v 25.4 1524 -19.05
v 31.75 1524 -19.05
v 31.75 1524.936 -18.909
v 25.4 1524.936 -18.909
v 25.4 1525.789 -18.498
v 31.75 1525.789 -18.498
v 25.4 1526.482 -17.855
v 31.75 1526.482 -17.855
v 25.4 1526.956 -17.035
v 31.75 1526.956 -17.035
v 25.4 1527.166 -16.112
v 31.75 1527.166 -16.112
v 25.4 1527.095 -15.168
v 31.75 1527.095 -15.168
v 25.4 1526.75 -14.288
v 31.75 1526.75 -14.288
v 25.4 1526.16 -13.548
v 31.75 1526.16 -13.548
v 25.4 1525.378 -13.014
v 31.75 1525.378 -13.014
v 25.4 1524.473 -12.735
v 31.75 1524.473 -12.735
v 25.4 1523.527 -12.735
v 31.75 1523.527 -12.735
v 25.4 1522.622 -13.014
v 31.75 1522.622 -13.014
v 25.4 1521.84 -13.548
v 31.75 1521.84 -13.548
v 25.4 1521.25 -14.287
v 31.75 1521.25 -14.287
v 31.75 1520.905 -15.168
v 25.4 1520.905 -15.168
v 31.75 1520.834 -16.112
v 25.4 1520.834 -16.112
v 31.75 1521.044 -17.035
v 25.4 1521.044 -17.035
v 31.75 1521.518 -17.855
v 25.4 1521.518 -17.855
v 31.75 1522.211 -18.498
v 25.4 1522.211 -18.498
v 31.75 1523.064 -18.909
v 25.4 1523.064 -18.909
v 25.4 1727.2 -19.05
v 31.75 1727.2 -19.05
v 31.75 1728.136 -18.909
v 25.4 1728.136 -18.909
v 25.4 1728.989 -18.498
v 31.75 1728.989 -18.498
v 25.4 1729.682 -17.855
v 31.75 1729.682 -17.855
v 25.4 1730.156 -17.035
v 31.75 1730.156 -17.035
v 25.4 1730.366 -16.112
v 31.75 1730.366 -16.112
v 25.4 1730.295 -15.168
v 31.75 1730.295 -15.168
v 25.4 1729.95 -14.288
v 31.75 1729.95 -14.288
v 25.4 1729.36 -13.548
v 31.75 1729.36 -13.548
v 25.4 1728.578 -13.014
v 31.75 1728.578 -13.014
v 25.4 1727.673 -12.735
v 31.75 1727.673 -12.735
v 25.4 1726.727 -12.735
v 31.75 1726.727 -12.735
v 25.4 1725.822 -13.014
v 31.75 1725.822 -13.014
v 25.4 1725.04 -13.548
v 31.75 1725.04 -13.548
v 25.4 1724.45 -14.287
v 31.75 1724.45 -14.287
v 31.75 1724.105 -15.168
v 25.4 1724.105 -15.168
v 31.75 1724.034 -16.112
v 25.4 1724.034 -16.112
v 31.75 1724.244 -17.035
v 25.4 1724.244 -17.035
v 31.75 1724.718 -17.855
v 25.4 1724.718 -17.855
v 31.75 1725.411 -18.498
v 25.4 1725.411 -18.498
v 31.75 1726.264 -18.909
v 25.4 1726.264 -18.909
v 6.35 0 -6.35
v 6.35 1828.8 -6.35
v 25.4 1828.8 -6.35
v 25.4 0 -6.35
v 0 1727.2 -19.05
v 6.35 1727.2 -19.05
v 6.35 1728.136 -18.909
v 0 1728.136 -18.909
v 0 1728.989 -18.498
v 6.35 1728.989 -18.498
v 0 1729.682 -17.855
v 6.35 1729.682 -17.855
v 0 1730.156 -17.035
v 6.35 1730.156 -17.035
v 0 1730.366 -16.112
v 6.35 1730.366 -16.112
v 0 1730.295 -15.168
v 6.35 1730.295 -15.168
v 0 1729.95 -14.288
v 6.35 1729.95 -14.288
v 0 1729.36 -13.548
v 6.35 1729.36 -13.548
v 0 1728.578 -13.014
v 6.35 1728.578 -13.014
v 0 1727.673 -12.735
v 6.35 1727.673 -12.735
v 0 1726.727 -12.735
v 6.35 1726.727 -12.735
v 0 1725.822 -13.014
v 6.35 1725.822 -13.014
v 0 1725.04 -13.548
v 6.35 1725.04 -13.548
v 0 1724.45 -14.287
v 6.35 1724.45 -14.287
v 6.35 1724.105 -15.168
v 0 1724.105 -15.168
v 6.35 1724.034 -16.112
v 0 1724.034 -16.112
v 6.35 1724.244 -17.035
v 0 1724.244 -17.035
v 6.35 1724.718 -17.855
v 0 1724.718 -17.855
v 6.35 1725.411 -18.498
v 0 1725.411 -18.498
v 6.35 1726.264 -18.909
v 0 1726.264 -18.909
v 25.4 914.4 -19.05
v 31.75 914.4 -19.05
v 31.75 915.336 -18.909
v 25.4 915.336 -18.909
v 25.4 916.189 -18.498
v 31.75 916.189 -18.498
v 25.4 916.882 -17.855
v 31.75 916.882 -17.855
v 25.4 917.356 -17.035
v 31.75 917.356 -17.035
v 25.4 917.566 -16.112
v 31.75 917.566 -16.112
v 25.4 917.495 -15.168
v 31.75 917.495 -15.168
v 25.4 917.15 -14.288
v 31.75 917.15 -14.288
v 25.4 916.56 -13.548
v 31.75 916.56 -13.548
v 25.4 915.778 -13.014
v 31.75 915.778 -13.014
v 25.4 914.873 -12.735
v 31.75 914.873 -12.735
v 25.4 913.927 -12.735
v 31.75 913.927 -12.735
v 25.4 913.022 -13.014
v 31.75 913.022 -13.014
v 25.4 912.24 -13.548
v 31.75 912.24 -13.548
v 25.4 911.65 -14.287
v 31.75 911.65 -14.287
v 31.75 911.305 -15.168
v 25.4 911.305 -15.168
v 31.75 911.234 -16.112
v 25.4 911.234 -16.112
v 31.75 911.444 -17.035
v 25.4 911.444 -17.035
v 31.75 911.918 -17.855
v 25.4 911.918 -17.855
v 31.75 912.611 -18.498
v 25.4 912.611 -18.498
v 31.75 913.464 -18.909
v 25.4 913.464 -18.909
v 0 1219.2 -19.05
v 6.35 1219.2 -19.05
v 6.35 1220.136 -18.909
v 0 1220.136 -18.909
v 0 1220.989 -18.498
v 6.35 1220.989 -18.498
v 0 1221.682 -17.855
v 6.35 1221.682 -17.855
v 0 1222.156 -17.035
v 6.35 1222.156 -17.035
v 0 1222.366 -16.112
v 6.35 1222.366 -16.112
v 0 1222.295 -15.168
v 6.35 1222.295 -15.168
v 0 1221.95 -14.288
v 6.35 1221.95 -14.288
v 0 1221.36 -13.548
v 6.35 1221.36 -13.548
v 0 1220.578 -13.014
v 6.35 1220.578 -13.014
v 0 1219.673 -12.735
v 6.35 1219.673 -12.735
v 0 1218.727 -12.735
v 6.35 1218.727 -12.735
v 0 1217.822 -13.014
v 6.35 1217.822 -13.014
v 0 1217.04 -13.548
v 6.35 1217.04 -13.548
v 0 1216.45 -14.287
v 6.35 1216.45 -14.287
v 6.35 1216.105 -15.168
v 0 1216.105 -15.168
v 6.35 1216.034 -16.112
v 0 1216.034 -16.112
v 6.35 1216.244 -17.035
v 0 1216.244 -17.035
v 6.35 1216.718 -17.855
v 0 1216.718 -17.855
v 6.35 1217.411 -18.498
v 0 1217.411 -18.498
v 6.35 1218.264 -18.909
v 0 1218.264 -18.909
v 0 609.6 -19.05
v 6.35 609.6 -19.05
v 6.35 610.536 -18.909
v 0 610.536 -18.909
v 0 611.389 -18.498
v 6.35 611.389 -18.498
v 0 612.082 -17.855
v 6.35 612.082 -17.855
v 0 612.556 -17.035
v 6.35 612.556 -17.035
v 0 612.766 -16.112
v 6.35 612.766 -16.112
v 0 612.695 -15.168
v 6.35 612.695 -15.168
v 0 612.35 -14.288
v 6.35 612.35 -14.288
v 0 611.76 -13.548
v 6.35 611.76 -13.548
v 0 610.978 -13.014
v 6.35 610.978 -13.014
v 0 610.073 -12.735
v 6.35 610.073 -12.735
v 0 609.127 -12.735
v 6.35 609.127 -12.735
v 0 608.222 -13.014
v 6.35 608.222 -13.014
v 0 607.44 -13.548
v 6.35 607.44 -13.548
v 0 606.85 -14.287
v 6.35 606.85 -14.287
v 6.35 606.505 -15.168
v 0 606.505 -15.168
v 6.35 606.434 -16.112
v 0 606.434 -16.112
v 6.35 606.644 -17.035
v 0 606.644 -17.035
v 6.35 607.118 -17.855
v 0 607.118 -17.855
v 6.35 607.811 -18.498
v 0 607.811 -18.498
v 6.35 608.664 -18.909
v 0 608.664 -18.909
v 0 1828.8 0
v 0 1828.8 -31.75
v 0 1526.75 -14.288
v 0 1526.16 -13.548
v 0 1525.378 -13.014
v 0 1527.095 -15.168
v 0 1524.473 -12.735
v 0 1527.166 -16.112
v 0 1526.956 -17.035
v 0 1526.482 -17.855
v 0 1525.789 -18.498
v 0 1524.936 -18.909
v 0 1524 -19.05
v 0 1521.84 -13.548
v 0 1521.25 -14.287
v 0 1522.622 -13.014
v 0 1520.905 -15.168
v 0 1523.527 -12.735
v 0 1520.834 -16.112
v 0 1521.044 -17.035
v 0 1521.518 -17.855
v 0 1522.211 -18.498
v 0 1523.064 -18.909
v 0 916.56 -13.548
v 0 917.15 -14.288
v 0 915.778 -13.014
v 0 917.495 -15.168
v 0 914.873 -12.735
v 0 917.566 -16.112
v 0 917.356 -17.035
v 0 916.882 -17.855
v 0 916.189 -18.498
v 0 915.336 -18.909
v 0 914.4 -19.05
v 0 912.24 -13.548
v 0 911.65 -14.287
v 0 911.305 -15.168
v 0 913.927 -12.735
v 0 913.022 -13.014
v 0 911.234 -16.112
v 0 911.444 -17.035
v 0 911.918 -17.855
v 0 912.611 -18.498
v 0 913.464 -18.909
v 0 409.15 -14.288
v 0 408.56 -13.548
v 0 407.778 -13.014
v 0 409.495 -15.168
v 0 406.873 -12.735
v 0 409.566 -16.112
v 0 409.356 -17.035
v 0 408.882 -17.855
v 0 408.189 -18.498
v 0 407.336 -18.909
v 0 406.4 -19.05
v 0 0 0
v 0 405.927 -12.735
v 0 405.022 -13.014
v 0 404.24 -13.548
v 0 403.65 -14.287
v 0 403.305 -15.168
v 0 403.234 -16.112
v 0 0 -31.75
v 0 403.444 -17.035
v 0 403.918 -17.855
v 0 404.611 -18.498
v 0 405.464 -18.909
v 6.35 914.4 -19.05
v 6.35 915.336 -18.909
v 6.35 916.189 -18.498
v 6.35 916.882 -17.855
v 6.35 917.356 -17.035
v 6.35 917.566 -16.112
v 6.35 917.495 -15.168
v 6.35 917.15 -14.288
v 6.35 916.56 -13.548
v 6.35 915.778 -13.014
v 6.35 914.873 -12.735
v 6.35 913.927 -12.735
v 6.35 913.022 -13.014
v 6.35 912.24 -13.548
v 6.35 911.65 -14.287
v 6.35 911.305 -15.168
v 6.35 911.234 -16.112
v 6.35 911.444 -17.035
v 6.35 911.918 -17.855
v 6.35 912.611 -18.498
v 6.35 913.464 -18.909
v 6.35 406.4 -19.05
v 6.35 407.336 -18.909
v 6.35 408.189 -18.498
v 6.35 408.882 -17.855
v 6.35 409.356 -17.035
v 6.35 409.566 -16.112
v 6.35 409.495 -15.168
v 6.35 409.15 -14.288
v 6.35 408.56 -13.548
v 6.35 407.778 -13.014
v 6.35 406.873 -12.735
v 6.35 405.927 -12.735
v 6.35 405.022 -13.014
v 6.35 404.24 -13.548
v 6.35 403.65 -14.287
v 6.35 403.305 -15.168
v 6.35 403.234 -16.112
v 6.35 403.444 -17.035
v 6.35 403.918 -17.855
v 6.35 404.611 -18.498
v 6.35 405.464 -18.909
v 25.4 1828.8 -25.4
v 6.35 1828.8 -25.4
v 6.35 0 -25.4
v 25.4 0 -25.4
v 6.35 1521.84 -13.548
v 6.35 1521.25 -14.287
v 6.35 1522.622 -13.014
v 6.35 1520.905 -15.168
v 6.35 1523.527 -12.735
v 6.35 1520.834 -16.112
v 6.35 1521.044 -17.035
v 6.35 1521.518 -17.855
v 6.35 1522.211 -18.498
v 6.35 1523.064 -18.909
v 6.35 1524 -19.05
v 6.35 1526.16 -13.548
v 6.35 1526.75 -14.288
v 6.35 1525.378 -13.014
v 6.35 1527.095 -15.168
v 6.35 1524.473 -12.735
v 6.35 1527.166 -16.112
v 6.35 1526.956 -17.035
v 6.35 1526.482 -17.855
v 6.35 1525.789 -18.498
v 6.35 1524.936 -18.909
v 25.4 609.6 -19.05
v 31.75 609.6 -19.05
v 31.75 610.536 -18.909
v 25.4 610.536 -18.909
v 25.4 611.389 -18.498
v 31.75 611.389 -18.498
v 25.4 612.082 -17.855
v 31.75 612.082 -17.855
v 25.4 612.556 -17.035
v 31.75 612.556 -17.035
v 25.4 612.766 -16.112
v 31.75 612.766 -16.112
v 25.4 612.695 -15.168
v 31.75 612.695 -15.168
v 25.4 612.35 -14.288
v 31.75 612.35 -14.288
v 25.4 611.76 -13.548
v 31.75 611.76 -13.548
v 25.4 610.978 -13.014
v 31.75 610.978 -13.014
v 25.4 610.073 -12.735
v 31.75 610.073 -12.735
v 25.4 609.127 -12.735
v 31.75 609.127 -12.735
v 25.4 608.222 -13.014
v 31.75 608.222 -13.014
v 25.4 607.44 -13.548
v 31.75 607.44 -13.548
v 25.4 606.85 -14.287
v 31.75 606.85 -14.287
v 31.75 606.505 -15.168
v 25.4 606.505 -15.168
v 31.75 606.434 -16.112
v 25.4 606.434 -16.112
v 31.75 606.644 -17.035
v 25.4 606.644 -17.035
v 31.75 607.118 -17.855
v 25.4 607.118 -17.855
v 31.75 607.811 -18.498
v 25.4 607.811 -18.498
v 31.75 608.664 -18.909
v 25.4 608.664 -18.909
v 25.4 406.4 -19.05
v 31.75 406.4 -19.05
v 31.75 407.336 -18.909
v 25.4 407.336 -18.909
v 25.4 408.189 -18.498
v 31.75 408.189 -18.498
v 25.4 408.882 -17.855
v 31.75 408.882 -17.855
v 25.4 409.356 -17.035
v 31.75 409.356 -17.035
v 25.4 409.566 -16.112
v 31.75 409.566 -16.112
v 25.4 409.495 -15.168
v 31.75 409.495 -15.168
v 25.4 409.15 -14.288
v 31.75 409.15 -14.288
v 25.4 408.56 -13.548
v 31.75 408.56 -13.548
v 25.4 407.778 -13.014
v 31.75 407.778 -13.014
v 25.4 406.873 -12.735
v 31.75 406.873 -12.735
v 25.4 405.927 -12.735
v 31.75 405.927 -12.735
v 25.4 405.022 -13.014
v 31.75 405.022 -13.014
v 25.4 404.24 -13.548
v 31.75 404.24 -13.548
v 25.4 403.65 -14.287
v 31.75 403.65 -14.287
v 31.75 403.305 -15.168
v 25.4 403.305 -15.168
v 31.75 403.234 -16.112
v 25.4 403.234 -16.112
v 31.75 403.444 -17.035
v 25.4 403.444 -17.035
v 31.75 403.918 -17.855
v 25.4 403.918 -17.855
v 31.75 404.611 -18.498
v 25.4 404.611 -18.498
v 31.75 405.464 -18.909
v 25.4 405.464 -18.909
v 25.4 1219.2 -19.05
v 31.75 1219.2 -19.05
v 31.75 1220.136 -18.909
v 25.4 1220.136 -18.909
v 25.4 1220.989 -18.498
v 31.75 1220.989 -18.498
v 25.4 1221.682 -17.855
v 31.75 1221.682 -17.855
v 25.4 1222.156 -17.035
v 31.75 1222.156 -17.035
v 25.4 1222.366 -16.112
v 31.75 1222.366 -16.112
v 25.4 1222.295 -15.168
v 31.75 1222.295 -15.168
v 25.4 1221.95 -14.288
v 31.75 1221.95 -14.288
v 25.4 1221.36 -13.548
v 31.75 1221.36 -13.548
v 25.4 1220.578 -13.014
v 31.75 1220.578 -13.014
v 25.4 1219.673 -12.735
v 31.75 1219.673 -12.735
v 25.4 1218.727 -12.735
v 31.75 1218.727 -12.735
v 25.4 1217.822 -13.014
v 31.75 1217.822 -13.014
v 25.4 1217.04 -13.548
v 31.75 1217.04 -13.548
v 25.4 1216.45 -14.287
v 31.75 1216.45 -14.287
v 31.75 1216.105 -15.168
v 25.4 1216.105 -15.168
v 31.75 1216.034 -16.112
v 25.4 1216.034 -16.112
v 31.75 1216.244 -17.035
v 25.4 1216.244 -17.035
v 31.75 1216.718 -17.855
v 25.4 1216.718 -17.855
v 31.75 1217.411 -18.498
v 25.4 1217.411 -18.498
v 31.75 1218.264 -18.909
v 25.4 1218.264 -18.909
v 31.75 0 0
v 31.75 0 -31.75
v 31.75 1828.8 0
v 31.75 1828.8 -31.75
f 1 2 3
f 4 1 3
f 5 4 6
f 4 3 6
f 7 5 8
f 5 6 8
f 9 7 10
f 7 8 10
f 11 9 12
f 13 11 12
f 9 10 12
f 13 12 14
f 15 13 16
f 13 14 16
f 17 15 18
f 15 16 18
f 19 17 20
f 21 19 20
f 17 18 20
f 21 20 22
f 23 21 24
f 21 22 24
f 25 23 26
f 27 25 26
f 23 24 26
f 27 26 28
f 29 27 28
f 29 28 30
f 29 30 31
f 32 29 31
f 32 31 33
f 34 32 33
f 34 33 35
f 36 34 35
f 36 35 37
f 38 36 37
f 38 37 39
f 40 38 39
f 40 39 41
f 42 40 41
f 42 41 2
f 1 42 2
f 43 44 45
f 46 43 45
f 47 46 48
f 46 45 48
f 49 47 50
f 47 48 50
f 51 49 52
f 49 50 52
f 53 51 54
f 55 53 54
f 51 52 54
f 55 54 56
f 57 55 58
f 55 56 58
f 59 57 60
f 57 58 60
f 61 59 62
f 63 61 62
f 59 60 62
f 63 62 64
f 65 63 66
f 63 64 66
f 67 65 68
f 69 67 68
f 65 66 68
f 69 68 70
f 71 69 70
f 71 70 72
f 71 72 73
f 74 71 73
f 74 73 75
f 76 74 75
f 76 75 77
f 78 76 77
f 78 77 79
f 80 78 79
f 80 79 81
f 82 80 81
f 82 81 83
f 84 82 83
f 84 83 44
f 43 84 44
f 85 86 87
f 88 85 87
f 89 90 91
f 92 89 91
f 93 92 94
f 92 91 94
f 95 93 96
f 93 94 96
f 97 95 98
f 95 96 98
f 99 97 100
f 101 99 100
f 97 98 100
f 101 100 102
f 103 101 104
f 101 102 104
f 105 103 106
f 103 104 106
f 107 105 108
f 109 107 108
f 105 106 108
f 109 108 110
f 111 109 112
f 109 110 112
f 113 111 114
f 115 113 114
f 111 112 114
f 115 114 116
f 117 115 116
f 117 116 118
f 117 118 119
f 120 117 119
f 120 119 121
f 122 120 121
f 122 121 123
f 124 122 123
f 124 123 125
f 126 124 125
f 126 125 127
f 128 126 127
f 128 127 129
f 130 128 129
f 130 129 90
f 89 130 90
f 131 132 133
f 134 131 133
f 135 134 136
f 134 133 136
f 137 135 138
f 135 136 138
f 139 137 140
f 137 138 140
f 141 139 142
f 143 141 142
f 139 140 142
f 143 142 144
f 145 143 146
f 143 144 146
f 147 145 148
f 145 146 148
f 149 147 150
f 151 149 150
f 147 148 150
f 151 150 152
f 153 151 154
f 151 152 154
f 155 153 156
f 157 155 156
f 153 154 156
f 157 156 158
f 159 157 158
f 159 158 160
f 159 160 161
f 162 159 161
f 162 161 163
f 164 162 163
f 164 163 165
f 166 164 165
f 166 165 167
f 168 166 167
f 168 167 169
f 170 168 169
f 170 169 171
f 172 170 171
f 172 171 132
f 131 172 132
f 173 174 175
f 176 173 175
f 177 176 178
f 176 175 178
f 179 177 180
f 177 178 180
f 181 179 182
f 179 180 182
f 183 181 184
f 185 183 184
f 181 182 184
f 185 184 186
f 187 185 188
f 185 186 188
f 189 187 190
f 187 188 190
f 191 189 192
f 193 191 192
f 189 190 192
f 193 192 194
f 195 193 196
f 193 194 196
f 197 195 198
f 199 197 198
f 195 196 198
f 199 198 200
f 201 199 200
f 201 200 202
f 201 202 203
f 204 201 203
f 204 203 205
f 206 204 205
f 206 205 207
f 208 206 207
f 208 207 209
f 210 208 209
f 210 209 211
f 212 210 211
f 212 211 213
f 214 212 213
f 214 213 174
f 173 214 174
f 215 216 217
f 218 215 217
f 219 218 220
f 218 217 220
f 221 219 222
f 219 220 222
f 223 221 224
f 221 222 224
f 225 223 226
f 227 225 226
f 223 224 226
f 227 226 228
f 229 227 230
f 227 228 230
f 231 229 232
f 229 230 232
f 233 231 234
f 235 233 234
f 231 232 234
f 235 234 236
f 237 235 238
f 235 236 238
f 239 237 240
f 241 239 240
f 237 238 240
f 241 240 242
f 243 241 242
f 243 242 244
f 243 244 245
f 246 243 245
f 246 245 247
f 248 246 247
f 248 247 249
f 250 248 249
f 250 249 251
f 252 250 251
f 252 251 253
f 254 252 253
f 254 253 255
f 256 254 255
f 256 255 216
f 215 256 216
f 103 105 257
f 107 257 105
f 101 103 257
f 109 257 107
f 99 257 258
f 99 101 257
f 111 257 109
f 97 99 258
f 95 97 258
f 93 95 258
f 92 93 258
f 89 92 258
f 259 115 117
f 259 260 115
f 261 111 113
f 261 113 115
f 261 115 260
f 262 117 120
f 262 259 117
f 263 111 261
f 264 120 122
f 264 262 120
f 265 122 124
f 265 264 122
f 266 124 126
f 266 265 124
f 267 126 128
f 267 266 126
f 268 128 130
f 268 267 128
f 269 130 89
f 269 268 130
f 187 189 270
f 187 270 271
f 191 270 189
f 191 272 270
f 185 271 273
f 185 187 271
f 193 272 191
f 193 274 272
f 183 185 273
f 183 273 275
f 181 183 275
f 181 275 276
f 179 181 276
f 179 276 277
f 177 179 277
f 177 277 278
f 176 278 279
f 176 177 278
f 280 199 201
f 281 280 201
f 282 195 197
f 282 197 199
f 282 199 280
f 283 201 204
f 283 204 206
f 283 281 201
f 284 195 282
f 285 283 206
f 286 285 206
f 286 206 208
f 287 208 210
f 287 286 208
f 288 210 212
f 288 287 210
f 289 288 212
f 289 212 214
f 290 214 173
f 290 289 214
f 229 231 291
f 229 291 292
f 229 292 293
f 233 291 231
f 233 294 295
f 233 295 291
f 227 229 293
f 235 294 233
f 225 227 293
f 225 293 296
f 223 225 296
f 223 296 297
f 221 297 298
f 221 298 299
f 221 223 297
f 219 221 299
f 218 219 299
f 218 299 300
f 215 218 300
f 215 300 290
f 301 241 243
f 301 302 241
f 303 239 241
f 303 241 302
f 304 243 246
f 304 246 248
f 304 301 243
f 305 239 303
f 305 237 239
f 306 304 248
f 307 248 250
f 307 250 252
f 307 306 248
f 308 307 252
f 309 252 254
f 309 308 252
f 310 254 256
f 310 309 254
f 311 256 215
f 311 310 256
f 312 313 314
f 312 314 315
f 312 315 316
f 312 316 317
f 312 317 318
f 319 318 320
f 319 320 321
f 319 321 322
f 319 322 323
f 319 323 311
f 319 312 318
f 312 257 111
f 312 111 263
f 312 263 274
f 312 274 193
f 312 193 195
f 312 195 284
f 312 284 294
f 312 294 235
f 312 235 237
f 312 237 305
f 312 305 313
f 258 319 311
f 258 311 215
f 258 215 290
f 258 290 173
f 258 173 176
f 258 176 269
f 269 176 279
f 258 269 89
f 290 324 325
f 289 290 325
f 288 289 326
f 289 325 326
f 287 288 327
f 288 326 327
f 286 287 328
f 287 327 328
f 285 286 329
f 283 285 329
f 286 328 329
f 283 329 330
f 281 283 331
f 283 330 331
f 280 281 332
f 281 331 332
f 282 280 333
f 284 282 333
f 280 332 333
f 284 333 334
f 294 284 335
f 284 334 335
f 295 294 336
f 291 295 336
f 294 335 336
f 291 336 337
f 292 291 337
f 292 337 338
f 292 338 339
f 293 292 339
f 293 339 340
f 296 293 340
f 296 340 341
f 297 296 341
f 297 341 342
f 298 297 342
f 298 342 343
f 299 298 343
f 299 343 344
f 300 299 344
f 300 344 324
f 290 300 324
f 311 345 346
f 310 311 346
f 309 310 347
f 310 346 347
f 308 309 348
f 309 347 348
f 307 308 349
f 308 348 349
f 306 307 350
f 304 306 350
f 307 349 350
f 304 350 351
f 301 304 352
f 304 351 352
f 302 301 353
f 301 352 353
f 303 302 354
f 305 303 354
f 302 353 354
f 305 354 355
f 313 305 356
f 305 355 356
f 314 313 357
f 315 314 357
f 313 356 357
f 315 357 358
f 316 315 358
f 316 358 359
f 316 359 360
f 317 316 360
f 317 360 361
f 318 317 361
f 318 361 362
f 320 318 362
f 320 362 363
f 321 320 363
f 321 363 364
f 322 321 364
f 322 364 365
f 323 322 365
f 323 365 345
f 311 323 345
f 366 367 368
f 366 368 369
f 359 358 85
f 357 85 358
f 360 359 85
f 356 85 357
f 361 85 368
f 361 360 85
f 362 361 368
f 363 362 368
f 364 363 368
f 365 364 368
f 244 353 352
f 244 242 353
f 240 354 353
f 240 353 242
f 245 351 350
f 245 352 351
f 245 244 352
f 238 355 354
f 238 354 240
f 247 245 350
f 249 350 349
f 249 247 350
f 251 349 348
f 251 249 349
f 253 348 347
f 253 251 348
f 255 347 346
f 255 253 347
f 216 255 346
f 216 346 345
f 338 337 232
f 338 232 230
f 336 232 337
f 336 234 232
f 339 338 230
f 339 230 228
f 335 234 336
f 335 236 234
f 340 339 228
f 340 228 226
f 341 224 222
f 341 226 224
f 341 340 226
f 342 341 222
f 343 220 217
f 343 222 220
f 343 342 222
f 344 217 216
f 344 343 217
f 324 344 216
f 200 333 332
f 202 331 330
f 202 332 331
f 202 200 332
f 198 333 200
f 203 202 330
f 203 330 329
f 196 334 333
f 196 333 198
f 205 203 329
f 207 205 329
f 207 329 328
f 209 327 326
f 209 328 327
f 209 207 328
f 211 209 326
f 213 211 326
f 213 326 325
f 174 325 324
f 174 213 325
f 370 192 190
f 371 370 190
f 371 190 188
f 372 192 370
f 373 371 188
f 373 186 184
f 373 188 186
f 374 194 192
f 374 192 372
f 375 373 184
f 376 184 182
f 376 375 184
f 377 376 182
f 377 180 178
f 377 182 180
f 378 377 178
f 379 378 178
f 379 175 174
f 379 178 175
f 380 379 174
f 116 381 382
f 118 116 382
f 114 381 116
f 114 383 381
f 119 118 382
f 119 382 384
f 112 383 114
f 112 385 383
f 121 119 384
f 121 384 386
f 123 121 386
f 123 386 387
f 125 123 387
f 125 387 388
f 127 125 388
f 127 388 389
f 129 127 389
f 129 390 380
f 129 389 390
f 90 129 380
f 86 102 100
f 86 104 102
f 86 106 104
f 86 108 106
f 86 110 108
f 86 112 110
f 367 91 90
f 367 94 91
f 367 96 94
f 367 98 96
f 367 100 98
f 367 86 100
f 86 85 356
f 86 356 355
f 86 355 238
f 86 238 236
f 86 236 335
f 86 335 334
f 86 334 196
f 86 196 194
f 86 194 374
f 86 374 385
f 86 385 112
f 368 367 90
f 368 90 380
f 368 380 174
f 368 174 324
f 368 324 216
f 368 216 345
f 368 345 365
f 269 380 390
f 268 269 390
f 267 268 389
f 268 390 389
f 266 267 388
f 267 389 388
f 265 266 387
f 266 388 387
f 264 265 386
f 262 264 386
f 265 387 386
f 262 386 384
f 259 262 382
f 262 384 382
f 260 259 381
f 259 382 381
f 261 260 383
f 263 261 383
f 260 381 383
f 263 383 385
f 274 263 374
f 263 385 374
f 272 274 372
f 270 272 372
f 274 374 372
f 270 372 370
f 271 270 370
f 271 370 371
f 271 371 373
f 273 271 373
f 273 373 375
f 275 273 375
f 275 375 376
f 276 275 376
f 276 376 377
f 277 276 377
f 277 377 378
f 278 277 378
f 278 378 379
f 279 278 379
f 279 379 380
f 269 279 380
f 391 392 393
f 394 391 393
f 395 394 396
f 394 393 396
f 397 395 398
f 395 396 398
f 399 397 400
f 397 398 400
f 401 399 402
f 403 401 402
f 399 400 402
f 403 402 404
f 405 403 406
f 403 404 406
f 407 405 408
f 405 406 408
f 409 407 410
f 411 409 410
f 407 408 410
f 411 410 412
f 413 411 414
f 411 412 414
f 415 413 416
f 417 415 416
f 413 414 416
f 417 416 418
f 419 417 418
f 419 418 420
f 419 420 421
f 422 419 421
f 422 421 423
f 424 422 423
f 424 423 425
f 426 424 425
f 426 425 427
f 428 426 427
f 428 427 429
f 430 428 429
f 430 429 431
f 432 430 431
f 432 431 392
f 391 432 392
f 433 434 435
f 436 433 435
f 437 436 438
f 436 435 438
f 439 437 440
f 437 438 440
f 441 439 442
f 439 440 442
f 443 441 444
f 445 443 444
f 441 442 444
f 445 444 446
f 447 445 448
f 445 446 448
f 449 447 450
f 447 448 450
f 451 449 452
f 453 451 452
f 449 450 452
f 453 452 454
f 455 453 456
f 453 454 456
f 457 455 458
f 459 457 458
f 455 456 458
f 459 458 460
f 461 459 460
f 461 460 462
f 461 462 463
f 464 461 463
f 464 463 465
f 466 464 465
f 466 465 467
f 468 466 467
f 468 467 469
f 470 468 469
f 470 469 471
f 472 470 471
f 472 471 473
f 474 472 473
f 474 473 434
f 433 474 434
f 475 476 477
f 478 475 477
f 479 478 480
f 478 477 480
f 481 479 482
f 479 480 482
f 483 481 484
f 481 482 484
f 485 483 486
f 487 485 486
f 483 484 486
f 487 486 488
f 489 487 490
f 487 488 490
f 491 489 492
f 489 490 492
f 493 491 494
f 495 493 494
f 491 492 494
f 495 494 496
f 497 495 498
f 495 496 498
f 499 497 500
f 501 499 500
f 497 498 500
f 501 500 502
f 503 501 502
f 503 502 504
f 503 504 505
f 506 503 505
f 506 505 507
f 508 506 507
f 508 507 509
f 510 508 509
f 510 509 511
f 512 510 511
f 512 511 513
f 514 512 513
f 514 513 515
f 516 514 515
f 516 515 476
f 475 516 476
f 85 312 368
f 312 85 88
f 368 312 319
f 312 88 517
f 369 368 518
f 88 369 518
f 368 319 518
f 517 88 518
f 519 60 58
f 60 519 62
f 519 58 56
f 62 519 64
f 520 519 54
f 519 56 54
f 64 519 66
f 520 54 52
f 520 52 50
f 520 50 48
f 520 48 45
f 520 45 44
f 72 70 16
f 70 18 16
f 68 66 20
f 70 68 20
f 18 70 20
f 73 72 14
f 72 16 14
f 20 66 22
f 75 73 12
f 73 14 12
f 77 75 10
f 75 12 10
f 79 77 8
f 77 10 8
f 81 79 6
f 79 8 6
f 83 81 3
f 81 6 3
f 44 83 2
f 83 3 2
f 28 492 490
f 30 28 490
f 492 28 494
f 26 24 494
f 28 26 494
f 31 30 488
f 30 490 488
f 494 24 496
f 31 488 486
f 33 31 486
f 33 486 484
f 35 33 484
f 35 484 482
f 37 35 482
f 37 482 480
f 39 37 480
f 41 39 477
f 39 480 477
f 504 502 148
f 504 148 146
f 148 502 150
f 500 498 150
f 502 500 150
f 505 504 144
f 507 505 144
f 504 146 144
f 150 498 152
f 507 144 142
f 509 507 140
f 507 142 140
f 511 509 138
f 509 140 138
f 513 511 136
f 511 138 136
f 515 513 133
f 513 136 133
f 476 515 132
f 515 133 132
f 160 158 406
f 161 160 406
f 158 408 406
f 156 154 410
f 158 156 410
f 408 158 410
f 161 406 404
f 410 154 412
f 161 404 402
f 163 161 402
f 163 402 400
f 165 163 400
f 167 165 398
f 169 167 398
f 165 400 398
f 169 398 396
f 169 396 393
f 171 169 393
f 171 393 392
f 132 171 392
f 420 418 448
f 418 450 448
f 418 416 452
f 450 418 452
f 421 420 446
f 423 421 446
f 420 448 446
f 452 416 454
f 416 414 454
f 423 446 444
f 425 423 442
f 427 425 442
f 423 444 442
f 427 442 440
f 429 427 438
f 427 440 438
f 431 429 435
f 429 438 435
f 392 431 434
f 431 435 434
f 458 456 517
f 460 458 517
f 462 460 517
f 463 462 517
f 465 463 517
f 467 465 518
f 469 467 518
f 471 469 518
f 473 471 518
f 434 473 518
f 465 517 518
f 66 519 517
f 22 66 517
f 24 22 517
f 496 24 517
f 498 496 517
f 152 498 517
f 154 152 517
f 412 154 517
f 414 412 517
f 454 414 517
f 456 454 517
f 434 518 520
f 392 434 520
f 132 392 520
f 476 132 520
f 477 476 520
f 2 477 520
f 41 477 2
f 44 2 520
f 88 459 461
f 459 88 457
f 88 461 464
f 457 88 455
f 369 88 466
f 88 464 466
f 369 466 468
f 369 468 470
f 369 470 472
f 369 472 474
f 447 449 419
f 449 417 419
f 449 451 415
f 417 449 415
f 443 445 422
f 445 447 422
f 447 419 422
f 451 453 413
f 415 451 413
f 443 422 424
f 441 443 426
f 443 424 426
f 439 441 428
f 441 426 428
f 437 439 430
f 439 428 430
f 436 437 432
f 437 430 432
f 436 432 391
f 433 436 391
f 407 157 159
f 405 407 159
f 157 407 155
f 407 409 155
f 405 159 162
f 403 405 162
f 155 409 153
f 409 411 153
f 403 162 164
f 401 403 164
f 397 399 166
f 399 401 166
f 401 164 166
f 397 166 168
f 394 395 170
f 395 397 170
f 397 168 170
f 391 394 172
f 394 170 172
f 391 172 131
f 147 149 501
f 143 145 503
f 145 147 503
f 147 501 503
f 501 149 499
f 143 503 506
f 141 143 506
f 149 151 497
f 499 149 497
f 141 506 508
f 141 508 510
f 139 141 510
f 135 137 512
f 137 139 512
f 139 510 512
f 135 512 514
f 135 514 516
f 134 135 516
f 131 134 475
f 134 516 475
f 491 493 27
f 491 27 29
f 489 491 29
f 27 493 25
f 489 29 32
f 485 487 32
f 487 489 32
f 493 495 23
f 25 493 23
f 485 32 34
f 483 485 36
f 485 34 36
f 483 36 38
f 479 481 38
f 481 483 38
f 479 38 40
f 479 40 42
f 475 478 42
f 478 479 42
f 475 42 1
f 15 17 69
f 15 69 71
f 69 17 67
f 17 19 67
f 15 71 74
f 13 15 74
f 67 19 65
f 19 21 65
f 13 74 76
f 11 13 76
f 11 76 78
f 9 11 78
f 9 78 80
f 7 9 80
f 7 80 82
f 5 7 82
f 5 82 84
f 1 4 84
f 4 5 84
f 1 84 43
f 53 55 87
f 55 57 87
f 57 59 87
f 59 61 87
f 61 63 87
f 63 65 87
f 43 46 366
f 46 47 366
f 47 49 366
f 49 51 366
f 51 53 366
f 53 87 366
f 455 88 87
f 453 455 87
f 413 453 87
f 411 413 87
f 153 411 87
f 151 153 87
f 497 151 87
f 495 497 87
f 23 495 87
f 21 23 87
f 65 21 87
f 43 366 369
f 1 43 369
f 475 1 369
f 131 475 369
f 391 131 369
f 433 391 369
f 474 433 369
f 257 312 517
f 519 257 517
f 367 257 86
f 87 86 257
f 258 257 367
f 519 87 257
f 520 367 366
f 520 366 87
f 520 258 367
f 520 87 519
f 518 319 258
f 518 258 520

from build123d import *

# Parameters (mm, degrees)
SKETCH1_W           = 31.75
SKETCH1_H           = 31.75
BOSS_EXTRUDE1_DEPTH = 1828.8
SKETCH2_W           = 19.05
SKETCH2_H           = 19.05
CUT_EXTRUDE1_DEPTH  = 1829.8
SKETCH3_R           = 3.175
CUT_EXTRUDE2_DEPTH  = 32.75
SKETCH4_R           = 3.175
CUT_EXTRUDE3_DEPTH  = 32.75


with BuildPart() as part:
    # Sketch1 → Boss-Extrude1 (new body)
    with BuildSketch(Plane(origin=(0, 0, 0), x_dir=(1, 0, 0), z_dir=(0, 1, 0))):
        with Locations((15.875, 15.875)):
            Rectangle(SKETCH1_W, SKETCH1_H)
    extrude(amount=BOSS_EXTRUDE1_DEPTH)

    # Sketch2 → Cut-Extrude1 (cut, through all)
    with BuildSketch(Plane(origin=(0, 1828.8, 0), x_dir=(1, 0, 0), z_dir=(0, 1, 0))):
        with Locations((15.875, 15.875)):
            Rectangle(SKETCH2_W, SKETCH2_H)
    extrude(amount=-CUT_EXTRUDE1_DEPTH, mode=Mode.SUBTRACT)

    # Sketch3 → Cut-Extrude2 (cut, through all)
    with BuildSketch(Plane(origin=(31.75, 0, 0), x_dir=(0, 0, -1), z_dir=(1, 0, 0))):
        with Locations((15.875, 1727.2)):
            Circle(SKETCH3_R)
    extrude(amount=-CUT_EXTRUDE2_DEPTH, mode=Mode.SUBTRACT)

    # Sketch4 → Cut-Extrude3 (cut, through all)
    with BuildSketch(Plane(origin=(31.75, 0, 0), x_dir=(0, 0, -1), z_dir=(1, 0, 0))):
        with Locations((15.875, 1524)):
            Circle(SKETCH4_R)
        with Locations((15.875, 1219.2)):
            Circle(SKETCH4_R)
        with Locations((15.875, 914.4)):
            Circle(SKETCH4_R)
        with Locations((15.875, 609.6)):
            Circle(SKETCH4_R)
        with Locations((15.875, 406.4)):
            Circle(SKETCH4_R)
    extrude(amount=-CUT_EXTRUDE3_DEPTH, mode=Mode.SUBTRACT)


solid = part.part
